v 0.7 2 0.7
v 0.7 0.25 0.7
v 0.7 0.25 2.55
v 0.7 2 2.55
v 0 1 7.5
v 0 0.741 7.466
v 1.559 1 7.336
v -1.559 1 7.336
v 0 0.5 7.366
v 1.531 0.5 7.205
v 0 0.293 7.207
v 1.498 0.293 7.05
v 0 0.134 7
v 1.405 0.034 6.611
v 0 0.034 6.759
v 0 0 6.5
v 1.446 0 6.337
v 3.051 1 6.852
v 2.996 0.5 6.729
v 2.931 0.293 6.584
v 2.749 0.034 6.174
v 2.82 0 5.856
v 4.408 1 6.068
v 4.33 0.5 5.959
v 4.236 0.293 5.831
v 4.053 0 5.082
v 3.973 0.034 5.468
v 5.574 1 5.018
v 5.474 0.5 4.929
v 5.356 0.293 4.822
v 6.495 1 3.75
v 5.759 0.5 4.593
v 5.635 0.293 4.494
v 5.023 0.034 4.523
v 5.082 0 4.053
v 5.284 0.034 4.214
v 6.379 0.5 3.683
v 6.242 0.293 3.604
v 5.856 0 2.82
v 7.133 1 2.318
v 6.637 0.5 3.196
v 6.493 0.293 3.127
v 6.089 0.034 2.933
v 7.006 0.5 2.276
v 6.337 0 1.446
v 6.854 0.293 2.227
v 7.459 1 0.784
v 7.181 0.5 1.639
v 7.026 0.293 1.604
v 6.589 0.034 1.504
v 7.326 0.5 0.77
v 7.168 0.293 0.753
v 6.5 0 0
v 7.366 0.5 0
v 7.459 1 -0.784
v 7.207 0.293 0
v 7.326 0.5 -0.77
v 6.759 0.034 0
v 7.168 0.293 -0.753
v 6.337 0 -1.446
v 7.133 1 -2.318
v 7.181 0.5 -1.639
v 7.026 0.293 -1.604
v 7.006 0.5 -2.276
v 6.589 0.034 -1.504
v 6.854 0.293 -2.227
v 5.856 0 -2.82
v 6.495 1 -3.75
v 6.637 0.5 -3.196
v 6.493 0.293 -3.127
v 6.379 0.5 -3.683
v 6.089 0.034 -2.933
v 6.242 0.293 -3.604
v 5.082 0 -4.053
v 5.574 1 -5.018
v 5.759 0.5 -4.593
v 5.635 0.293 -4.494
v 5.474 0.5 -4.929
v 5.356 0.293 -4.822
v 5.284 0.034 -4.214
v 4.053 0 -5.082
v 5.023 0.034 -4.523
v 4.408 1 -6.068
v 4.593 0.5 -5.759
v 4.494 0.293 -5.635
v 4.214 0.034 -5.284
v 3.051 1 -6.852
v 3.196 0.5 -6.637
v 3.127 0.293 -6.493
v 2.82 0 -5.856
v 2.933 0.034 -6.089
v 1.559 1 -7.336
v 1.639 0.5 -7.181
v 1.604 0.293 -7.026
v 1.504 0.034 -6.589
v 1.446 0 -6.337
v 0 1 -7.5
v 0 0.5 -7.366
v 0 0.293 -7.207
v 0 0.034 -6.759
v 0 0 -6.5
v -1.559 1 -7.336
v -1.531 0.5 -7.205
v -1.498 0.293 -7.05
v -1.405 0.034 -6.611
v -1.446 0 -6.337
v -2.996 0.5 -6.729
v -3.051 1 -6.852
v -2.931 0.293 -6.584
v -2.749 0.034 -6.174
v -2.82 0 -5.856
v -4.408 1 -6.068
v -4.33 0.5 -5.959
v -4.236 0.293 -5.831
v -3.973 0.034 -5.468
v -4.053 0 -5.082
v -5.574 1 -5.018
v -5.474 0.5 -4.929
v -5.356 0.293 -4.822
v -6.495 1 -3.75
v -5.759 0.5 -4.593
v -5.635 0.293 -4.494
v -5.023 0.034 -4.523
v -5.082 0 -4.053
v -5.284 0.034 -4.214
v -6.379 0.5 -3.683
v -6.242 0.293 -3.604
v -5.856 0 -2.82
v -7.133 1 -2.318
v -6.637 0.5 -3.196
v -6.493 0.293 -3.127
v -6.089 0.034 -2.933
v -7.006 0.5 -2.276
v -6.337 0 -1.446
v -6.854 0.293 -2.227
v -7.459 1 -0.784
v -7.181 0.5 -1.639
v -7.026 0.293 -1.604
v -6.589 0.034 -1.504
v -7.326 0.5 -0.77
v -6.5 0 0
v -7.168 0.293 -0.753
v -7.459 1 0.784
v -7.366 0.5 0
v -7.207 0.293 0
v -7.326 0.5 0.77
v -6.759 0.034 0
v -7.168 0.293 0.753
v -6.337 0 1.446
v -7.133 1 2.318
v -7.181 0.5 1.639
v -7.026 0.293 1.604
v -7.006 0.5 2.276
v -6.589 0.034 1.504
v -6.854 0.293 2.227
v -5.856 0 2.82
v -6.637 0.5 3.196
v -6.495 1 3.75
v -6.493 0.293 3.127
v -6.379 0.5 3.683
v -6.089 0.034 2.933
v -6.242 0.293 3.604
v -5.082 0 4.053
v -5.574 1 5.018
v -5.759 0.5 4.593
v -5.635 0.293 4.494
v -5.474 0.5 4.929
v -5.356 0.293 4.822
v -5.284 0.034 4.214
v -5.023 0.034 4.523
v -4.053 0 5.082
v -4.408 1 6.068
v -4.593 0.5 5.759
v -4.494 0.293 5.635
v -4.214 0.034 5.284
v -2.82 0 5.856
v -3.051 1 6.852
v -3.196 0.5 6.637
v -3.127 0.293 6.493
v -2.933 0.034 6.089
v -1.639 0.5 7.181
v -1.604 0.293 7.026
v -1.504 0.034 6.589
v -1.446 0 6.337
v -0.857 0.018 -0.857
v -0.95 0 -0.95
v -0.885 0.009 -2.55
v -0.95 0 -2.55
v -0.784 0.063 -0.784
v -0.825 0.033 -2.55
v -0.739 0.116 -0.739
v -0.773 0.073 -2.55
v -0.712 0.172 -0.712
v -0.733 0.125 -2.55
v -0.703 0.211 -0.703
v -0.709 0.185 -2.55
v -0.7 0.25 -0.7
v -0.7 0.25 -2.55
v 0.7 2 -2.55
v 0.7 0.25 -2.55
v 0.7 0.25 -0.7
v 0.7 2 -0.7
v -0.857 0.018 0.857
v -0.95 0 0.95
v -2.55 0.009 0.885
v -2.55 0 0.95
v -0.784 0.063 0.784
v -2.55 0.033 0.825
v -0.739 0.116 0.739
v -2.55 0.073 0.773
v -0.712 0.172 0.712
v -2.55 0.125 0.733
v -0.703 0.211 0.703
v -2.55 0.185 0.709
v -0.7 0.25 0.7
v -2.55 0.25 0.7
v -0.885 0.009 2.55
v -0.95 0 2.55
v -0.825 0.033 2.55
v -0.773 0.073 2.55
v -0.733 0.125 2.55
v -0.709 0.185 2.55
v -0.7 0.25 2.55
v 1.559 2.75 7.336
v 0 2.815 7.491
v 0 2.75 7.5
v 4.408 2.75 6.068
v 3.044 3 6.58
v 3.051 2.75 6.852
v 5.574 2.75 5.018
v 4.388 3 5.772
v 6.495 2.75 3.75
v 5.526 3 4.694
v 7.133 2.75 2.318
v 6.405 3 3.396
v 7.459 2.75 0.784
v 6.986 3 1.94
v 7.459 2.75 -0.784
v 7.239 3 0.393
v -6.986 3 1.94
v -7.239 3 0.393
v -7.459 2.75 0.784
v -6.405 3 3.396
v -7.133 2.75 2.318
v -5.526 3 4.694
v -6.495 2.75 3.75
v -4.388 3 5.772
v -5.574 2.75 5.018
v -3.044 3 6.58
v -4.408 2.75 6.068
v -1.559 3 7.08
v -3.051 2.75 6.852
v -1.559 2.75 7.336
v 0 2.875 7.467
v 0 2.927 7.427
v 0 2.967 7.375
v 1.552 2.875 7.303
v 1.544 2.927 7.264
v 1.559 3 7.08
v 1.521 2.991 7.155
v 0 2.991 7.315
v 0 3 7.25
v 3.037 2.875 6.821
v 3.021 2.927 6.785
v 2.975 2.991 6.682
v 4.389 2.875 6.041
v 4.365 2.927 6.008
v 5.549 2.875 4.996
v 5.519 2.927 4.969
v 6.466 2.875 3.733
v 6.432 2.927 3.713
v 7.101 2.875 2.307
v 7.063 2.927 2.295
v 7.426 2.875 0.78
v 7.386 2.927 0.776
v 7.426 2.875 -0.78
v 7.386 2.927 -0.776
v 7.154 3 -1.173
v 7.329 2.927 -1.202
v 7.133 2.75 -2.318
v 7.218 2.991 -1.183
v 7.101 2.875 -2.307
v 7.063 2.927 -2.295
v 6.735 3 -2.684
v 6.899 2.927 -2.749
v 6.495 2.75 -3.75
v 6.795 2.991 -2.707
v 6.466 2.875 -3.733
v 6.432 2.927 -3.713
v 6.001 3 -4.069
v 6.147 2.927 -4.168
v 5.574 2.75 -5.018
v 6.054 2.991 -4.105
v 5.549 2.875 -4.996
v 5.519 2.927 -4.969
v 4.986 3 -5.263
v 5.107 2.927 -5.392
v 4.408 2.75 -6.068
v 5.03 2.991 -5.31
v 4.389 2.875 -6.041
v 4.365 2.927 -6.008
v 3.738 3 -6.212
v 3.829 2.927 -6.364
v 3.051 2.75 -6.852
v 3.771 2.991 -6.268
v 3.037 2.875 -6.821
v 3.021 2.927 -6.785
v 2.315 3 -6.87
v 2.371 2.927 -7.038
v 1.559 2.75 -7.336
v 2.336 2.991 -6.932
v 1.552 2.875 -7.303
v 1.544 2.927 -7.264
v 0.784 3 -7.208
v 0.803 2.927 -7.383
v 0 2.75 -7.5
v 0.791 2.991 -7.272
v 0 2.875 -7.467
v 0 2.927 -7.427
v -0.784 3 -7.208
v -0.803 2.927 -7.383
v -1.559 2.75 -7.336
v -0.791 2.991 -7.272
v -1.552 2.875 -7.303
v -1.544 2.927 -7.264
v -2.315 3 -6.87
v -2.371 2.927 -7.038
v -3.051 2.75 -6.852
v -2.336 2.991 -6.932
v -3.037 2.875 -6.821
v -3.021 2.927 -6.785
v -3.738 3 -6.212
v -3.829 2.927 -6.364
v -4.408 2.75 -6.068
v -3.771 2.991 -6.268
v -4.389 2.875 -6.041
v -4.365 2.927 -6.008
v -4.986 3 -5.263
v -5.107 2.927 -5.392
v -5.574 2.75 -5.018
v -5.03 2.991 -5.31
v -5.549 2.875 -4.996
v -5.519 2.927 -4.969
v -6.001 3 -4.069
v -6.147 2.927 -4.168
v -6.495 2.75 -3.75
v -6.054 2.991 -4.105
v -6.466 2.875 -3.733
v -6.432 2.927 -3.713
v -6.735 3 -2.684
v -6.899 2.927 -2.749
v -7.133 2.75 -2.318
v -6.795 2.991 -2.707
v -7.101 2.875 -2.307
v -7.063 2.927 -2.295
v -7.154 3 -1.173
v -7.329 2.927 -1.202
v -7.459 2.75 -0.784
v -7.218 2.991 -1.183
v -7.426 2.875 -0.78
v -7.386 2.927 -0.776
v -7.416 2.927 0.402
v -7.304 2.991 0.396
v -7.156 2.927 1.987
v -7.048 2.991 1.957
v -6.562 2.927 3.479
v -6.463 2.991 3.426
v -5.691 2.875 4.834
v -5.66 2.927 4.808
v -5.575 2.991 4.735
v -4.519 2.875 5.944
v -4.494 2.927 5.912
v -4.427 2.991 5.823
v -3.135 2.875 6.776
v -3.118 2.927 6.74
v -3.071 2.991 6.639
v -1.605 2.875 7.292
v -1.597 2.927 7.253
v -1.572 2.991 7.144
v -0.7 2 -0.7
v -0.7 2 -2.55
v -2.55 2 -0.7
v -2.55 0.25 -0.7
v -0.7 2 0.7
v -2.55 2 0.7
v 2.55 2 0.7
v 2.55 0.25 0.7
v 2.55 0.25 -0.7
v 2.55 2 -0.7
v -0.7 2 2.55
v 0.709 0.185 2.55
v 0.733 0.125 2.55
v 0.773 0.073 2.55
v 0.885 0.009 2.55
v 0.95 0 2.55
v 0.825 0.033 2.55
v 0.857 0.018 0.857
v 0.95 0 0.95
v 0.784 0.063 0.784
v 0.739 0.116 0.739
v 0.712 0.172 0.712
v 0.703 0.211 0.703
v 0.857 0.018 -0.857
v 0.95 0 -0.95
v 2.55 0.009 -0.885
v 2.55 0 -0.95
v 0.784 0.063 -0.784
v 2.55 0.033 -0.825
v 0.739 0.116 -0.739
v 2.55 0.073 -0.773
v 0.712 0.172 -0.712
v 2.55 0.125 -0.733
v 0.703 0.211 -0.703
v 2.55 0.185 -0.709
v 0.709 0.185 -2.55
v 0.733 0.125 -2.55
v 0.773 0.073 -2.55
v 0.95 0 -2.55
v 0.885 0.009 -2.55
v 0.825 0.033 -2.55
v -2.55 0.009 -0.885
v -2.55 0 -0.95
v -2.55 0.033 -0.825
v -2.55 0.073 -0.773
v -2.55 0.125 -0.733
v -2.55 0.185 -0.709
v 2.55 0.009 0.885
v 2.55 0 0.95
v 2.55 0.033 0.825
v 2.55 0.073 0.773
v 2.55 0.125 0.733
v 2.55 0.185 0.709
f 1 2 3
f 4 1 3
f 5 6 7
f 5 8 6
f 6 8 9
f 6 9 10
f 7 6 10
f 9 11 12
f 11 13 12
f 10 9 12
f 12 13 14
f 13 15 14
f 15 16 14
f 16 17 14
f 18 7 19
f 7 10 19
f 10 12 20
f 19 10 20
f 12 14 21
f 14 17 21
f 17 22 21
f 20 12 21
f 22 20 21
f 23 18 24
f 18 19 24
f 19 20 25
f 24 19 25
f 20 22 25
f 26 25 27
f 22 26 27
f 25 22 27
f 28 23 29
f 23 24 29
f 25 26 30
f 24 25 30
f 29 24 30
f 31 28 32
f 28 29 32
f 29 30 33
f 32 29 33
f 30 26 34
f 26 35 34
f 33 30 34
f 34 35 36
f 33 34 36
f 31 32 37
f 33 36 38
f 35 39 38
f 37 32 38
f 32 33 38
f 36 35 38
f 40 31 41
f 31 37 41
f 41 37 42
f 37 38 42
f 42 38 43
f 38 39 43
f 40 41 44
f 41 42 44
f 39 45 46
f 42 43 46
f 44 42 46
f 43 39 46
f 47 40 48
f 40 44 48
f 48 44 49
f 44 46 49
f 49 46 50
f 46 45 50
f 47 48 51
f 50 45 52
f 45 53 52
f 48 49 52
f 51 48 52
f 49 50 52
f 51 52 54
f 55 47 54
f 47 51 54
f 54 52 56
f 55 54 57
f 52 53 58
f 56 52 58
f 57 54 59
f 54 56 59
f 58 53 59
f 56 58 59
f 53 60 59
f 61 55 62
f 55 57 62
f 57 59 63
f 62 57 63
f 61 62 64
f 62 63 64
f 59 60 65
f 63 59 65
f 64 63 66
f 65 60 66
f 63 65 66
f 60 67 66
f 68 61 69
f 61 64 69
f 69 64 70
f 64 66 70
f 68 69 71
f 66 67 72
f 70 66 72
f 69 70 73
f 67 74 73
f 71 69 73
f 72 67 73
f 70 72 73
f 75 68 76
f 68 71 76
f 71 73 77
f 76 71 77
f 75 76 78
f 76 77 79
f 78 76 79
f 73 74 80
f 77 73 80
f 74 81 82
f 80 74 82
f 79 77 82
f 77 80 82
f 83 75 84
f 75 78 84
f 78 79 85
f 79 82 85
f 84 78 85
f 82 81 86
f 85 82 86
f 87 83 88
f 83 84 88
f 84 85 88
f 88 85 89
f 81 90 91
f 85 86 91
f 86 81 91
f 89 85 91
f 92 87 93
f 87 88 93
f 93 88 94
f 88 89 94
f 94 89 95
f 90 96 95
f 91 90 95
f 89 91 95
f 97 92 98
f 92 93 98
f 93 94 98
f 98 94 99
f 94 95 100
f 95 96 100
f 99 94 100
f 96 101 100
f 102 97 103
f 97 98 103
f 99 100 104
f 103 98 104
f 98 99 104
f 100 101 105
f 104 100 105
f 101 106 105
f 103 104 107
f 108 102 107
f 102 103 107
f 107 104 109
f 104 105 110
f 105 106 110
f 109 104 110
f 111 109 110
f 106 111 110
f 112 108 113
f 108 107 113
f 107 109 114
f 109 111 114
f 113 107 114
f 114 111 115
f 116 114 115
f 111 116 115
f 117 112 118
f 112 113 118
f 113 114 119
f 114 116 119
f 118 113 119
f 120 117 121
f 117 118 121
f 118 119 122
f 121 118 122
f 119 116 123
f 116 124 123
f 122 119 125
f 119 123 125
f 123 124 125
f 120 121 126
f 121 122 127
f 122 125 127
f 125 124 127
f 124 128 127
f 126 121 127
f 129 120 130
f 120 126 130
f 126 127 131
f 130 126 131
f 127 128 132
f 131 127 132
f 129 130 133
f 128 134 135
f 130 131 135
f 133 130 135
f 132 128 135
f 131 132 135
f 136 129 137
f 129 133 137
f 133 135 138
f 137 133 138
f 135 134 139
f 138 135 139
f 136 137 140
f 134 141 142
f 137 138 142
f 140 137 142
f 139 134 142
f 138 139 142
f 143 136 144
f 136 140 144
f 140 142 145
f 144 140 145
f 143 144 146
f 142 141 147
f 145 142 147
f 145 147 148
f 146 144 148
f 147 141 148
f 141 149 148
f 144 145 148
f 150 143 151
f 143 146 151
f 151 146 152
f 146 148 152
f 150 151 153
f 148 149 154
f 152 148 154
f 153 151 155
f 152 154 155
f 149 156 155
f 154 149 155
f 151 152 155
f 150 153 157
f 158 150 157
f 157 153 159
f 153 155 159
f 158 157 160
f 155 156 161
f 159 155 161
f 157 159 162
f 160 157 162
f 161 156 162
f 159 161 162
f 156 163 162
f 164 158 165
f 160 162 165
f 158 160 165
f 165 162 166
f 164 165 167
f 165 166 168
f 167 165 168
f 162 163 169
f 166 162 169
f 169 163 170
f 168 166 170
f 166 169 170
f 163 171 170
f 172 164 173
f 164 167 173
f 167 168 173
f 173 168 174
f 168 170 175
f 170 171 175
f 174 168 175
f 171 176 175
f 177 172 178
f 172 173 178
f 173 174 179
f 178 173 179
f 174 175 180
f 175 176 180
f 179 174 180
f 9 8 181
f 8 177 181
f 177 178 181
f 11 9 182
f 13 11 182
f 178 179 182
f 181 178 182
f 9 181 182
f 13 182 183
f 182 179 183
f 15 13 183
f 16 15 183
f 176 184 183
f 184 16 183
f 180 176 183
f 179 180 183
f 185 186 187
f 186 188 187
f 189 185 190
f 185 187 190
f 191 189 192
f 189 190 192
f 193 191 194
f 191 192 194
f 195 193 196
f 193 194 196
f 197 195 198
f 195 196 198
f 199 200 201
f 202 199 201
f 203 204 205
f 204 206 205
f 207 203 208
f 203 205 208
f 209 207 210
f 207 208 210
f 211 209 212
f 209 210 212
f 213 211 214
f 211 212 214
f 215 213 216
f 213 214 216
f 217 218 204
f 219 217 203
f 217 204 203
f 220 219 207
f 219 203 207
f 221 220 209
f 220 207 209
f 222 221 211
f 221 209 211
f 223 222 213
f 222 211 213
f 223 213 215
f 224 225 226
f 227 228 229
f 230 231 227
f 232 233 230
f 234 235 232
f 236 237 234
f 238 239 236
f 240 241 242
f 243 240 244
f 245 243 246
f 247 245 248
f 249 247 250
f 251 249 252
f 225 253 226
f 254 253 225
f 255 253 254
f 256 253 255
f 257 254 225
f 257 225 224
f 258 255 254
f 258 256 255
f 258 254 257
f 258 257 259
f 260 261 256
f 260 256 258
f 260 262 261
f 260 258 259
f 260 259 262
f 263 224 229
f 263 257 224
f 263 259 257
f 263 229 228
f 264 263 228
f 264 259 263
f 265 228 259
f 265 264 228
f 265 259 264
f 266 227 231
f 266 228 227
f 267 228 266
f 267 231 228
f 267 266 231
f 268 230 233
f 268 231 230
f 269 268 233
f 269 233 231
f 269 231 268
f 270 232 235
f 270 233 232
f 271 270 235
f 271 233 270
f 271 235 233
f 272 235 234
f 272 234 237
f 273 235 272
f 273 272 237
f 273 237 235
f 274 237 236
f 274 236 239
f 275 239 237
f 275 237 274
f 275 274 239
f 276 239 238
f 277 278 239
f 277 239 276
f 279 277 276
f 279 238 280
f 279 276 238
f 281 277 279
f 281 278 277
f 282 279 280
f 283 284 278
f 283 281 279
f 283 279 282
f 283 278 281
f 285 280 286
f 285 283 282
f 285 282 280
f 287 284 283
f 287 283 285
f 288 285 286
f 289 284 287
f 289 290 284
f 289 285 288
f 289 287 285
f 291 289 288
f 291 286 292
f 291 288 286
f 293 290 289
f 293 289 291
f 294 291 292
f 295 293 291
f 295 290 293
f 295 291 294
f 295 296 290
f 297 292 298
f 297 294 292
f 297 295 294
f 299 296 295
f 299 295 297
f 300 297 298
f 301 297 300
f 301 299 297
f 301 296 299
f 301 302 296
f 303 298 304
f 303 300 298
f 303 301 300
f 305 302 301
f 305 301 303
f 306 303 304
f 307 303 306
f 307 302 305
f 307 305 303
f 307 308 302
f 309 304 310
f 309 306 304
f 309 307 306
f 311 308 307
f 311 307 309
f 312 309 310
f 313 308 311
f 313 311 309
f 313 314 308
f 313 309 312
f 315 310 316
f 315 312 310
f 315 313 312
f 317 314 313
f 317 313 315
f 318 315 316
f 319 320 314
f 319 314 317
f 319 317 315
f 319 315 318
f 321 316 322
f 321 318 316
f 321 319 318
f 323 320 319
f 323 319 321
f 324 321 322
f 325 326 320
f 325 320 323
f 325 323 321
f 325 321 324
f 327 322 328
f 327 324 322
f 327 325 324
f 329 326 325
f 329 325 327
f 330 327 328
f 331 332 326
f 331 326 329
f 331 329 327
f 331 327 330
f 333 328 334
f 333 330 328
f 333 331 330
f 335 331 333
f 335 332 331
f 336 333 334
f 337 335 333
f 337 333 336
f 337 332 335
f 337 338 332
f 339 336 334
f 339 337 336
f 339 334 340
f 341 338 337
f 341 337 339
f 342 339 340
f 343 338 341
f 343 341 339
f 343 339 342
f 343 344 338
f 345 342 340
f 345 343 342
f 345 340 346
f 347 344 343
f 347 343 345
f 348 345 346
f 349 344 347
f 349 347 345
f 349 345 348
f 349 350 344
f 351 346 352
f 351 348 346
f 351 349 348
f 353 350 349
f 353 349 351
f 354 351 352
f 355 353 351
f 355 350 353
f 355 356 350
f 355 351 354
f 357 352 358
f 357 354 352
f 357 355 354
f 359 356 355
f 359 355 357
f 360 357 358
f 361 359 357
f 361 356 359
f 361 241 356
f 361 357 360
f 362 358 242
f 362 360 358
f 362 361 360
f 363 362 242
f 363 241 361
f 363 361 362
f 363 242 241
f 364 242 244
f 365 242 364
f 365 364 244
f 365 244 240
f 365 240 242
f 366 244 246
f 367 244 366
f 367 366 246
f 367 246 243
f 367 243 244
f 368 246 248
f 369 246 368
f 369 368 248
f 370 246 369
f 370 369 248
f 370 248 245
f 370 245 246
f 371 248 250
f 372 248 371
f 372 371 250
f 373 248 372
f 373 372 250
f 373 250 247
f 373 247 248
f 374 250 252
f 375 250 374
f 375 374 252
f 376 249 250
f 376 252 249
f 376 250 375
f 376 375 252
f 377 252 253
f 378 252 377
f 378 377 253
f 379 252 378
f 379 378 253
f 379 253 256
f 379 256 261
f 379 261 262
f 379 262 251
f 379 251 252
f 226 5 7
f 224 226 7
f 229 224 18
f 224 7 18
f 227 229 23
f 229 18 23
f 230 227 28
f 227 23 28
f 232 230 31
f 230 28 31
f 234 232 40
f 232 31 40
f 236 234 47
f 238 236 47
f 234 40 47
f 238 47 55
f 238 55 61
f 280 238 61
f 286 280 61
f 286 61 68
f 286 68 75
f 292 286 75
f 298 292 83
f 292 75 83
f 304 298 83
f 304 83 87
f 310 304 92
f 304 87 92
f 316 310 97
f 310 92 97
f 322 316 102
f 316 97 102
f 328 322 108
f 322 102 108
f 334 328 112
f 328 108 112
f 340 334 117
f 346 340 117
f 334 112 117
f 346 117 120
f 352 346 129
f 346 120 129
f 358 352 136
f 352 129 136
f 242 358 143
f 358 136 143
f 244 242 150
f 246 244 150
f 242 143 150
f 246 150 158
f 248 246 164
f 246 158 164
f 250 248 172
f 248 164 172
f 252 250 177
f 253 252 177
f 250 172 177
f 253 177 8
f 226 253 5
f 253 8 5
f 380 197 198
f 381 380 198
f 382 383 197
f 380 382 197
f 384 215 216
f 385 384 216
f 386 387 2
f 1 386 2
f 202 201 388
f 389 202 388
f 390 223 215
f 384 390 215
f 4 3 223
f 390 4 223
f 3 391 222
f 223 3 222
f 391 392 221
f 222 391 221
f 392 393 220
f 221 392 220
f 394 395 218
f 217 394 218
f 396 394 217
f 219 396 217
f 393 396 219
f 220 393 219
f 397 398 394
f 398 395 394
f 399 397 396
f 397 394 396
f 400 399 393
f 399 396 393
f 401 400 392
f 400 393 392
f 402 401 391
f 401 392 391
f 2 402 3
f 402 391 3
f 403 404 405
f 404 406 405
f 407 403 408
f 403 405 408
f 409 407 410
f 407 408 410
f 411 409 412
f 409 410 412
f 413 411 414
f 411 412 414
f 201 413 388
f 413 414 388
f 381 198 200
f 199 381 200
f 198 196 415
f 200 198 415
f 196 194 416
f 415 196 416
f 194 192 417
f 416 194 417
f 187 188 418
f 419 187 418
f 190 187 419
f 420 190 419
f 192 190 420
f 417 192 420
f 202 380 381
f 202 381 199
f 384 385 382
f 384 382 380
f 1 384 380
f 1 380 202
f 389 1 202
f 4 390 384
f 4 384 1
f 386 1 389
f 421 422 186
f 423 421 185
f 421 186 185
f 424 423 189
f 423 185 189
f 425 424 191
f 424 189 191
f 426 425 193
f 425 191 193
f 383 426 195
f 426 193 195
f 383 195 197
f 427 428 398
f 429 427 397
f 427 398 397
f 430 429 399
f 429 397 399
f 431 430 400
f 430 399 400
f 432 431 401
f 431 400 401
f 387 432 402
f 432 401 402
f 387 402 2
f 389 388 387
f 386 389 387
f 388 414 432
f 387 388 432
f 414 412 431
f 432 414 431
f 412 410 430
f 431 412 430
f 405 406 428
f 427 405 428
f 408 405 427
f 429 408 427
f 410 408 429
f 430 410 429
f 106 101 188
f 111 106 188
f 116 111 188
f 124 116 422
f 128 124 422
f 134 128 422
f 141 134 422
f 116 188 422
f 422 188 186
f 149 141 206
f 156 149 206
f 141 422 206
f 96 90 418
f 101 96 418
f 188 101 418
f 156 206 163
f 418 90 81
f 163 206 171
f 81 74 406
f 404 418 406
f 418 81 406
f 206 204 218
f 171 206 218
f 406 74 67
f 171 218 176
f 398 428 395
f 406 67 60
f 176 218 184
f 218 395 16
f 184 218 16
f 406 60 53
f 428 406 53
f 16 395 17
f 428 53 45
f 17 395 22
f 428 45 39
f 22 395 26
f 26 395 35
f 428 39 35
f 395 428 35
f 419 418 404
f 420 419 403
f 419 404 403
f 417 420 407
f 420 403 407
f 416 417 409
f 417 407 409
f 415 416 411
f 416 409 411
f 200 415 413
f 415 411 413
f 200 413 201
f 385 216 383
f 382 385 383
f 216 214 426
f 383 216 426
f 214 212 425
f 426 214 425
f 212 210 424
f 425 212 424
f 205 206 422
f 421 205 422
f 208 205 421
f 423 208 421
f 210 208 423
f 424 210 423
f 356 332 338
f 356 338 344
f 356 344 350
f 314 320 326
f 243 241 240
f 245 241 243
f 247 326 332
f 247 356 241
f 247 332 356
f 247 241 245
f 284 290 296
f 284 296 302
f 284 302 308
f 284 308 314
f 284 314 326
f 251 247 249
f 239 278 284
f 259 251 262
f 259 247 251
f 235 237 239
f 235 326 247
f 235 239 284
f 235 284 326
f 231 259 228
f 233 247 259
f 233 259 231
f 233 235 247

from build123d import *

# Parameters (mm, degrees)
SKETCH1_R           = 7.5
BOSS_EXTRUDE1_DEPTH = 3
FILLET1_R           = 1
CUT_EXTRUDE1_DEPTH  = 2
FILLET2_R           = 0.25


with BuildPart() as part:
    # Sketch1 → Boss-Extrude1 (new body)
    with BuildSketch(Plane(origin=(0, 0, 0), x_dir=(1, 0, 0), z_dir=(0, 1, 0))):
        with Locations(Location((0, 0, 0), (0, 0, 270))):  # turned: the seam where the file's is
            Circle(SKETCH1_R)
    extrude(amount=BOSS_EXTRUDE1_DEPTH)

    # Fillet1
    fillet1_edges = [part.edges().sort_by_distance(p)[0] for p in [
        (0, 0, -7.5),
    ]]
    fillet(fillet1_edges, radius=FILLET1_R)

    # Sketch2 → Cut-Extrude1 (cut)
    with BuildSketch(Plane.XZ):
        Polygon((-0.7, -0.7), (-0.7, -2.55), (0.7, -2.55), (0.7, -0.7), (2.55, -0.7), (2.55, 0.7), (0.7, 0.7), (0.7, 2.55), (-0.7, 2.55), (-0.7, 0.7), (-2.55, 0.7), (-2.55, -0.7), align=None)
    extrude(amount=-CUT_EXTRUDE1_DEPTH, mode=Mode.SUBTRACT)

    # Fillet2
    fillet2_edges = [part.edges().sort_by_distance(p)[0] for p in [
        (0.7, 0, -1.625),
        (1.625, 0, -0.7),
        (1.625, 0, 0.7),
        (0.7, 0, 1.625),
        (-0.7, 0, 1.625),
        (-1.625, 0, 0.7),
        (-1.625, 0, -0.7),
        (-0.7, 0, -1.625),
        (0, 3, -7.5),
    ]]
    fillet(fillet2_edges, radius=FILLET2_R)


solid = part.part
